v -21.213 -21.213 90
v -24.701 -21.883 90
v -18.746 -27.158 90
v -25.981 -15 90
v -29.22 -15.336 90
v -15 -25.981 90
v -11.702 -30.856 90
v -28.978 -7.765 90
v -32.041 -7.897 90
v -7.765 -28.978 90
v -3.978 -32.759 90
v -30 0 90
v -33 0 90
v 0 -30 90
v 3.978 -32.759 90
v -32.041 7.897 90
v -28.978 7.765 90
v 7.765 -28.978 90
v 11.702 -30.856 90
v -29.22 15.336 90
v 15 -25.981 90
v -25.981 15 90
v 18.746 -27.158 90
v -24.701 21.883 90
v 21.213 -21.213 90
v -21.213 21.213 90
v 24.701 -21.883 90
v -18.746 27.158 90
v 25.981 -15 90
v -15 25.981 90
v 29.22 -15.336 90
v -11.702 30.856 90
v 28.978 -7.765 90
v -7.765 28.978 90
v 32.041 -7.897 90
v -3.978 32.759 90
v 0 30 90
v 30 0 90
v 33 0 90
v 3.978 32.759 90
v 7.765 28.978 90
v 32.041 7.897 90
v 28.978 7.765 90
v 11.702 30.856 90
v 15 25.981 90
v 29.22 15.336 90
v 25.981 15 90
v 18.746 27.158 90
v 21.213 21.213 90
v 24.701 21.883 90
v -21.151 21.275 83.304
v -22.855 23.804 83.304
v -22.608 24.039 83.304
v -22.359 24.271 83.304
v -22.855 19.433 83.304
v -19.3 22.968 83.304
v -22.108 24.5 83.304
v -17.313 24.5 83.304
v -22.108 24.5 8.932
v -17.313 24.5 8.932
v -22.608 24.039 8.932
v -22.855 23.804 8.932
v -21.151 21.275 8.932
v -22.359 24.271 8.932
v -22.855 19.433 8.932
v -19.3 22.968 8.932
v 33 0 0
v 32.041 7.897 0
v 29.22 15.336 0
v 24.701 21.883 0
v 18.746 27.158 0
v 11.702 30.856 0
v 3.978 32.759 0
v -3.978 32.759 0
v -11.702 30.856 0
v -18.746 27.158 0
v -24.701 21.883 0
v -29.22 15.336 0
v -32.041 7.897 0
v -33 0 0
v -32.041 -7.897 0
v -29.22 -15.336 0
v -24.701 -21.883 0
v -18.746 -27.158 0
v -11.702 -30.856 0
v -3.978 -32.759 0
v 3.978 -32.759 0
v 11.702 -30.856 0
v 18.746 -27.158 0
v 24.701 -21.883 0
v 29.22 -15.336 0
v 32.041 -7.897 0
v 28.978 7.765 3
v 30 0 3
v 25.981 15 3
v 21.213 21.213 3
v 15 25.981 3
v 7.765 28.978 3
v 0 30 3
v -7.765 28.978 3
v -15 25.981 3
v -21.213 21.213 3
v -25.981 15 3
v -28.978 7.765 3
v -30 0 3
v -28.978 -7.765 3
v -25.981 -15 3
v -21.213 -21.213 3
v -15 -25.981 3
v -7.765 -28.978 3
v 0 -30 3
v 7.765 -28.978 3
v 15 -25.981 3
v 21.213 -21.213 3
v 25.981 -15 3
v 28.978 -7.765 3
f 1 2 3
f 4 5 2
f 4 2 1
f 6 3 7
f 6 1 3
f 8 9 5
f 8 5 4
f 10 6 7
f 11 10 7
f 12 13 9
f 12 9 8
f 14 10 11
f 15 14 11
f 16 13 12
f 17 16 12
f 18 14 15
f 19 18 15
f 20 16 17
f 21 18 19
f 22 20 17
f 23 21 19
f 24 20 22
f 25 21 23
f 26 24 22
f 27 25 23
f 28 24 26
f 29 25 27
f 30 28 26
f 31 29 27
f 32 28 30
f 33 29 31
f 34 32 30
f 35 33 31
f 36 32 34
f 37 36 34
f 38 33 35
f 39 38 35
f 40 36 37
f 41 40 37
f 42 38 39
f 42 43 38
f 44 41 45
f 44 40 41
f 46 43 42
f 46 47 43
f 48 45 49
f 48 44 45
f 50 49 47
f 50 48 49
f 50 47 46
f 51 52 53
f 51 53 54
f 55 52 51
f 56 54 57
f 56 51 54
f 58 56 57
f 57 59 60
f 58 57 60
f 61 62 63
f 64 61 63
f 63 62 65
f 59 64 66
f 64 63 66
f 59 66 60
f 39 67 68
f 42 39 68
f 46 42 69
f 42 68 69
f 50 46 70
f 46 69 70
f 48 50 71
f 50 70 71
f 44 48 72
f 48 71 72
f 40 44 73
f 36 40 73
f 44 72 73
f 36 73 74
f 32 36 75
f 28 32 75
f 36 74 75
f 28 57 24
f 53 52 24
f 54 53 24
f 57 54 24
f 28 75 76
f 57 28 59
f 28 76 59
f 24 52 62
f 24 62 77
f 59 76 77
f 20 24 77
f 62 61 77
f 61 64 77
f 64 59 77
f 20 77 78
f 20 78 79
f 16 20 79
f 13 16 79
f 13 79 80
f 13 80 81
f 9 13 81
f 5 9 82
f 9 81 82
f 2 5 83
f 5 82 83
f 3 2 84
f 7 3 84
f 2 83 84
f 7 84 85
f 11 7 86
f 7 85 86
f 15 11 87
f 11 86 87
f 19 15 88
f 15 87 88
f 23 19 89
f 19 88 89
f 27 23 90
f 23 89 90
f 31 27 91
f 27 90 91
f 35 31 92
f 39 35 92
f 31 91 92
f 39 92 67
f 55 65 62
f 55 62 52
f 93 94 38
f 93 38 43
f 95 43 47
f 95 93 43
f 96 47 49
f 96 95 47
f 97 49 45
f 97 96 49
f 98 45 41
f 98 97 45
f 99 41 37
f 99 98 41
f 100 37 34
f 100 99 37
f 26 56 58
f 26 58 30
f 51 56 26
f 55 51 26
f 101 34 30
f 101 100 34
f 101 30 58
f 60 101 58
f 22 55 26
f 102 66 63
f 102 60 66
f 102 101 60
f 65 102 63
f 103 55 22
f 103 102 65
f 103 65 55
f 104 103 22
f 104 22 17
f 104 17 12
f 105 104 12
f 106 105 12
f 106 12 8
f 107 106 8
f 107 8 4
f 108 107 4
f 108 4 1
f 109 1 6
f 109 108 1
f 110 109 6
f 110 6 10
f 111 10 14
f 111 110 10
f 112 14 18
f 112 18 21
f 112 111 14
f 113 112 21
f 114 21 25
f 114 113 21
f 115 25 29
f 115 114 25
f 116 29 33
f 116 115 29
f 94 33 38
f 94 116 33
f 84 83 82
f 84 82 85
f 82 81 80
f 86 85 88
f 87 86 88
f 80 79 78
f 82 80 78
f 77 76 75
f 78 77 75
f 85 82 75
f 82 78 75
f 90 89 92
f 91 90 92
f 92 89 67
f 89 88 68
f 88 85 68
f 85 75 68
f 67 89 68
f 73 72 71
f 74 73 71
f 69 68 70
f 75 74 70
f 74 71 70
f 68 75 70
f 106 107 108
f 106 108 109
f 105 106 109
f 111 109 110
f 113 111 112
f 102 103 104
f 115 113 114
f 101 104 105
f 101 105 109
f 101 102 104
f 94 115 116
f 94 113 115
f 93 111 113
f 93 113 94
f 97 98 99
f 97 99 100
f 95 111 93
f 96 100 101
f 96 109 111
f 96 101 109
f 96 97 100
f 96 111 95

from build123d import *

# Parameters (mm, degrees)
F0_R     = 30
F1_DEPTH = 3
F0_R_2   = 33
F2_DEPTH = 90
F3_W     = 9.444052
F3_H     = 74.371448
F4_DEPTH = 24.5


with BuildPart() as f1:
    # F0 (on Top) → F1 (new body)
    with BuildSketch(Plane.XY):
        Circle(F0_R)
    extrude(amount=F1_DEPTH)

    # F0 (on Top) → F2 (join)
    with BuildSketch(Plane.XY):
        Circle(F0_R_2)
        Circle(F0_R, mode=Mode.SUBTRACT)
    extrude(amount=F2_DEPTH)

    # F3 (on Front) → F4 (cut)
    with BuildSketch(Plane.XZ):
        with Locations((-18.13293, 46.117877)):
            Rectangle(F3_W, F3_H)
    extrude(amount=-F4_DEPTH, mode=Mode.SUBTRACT)


solid = f1.part
